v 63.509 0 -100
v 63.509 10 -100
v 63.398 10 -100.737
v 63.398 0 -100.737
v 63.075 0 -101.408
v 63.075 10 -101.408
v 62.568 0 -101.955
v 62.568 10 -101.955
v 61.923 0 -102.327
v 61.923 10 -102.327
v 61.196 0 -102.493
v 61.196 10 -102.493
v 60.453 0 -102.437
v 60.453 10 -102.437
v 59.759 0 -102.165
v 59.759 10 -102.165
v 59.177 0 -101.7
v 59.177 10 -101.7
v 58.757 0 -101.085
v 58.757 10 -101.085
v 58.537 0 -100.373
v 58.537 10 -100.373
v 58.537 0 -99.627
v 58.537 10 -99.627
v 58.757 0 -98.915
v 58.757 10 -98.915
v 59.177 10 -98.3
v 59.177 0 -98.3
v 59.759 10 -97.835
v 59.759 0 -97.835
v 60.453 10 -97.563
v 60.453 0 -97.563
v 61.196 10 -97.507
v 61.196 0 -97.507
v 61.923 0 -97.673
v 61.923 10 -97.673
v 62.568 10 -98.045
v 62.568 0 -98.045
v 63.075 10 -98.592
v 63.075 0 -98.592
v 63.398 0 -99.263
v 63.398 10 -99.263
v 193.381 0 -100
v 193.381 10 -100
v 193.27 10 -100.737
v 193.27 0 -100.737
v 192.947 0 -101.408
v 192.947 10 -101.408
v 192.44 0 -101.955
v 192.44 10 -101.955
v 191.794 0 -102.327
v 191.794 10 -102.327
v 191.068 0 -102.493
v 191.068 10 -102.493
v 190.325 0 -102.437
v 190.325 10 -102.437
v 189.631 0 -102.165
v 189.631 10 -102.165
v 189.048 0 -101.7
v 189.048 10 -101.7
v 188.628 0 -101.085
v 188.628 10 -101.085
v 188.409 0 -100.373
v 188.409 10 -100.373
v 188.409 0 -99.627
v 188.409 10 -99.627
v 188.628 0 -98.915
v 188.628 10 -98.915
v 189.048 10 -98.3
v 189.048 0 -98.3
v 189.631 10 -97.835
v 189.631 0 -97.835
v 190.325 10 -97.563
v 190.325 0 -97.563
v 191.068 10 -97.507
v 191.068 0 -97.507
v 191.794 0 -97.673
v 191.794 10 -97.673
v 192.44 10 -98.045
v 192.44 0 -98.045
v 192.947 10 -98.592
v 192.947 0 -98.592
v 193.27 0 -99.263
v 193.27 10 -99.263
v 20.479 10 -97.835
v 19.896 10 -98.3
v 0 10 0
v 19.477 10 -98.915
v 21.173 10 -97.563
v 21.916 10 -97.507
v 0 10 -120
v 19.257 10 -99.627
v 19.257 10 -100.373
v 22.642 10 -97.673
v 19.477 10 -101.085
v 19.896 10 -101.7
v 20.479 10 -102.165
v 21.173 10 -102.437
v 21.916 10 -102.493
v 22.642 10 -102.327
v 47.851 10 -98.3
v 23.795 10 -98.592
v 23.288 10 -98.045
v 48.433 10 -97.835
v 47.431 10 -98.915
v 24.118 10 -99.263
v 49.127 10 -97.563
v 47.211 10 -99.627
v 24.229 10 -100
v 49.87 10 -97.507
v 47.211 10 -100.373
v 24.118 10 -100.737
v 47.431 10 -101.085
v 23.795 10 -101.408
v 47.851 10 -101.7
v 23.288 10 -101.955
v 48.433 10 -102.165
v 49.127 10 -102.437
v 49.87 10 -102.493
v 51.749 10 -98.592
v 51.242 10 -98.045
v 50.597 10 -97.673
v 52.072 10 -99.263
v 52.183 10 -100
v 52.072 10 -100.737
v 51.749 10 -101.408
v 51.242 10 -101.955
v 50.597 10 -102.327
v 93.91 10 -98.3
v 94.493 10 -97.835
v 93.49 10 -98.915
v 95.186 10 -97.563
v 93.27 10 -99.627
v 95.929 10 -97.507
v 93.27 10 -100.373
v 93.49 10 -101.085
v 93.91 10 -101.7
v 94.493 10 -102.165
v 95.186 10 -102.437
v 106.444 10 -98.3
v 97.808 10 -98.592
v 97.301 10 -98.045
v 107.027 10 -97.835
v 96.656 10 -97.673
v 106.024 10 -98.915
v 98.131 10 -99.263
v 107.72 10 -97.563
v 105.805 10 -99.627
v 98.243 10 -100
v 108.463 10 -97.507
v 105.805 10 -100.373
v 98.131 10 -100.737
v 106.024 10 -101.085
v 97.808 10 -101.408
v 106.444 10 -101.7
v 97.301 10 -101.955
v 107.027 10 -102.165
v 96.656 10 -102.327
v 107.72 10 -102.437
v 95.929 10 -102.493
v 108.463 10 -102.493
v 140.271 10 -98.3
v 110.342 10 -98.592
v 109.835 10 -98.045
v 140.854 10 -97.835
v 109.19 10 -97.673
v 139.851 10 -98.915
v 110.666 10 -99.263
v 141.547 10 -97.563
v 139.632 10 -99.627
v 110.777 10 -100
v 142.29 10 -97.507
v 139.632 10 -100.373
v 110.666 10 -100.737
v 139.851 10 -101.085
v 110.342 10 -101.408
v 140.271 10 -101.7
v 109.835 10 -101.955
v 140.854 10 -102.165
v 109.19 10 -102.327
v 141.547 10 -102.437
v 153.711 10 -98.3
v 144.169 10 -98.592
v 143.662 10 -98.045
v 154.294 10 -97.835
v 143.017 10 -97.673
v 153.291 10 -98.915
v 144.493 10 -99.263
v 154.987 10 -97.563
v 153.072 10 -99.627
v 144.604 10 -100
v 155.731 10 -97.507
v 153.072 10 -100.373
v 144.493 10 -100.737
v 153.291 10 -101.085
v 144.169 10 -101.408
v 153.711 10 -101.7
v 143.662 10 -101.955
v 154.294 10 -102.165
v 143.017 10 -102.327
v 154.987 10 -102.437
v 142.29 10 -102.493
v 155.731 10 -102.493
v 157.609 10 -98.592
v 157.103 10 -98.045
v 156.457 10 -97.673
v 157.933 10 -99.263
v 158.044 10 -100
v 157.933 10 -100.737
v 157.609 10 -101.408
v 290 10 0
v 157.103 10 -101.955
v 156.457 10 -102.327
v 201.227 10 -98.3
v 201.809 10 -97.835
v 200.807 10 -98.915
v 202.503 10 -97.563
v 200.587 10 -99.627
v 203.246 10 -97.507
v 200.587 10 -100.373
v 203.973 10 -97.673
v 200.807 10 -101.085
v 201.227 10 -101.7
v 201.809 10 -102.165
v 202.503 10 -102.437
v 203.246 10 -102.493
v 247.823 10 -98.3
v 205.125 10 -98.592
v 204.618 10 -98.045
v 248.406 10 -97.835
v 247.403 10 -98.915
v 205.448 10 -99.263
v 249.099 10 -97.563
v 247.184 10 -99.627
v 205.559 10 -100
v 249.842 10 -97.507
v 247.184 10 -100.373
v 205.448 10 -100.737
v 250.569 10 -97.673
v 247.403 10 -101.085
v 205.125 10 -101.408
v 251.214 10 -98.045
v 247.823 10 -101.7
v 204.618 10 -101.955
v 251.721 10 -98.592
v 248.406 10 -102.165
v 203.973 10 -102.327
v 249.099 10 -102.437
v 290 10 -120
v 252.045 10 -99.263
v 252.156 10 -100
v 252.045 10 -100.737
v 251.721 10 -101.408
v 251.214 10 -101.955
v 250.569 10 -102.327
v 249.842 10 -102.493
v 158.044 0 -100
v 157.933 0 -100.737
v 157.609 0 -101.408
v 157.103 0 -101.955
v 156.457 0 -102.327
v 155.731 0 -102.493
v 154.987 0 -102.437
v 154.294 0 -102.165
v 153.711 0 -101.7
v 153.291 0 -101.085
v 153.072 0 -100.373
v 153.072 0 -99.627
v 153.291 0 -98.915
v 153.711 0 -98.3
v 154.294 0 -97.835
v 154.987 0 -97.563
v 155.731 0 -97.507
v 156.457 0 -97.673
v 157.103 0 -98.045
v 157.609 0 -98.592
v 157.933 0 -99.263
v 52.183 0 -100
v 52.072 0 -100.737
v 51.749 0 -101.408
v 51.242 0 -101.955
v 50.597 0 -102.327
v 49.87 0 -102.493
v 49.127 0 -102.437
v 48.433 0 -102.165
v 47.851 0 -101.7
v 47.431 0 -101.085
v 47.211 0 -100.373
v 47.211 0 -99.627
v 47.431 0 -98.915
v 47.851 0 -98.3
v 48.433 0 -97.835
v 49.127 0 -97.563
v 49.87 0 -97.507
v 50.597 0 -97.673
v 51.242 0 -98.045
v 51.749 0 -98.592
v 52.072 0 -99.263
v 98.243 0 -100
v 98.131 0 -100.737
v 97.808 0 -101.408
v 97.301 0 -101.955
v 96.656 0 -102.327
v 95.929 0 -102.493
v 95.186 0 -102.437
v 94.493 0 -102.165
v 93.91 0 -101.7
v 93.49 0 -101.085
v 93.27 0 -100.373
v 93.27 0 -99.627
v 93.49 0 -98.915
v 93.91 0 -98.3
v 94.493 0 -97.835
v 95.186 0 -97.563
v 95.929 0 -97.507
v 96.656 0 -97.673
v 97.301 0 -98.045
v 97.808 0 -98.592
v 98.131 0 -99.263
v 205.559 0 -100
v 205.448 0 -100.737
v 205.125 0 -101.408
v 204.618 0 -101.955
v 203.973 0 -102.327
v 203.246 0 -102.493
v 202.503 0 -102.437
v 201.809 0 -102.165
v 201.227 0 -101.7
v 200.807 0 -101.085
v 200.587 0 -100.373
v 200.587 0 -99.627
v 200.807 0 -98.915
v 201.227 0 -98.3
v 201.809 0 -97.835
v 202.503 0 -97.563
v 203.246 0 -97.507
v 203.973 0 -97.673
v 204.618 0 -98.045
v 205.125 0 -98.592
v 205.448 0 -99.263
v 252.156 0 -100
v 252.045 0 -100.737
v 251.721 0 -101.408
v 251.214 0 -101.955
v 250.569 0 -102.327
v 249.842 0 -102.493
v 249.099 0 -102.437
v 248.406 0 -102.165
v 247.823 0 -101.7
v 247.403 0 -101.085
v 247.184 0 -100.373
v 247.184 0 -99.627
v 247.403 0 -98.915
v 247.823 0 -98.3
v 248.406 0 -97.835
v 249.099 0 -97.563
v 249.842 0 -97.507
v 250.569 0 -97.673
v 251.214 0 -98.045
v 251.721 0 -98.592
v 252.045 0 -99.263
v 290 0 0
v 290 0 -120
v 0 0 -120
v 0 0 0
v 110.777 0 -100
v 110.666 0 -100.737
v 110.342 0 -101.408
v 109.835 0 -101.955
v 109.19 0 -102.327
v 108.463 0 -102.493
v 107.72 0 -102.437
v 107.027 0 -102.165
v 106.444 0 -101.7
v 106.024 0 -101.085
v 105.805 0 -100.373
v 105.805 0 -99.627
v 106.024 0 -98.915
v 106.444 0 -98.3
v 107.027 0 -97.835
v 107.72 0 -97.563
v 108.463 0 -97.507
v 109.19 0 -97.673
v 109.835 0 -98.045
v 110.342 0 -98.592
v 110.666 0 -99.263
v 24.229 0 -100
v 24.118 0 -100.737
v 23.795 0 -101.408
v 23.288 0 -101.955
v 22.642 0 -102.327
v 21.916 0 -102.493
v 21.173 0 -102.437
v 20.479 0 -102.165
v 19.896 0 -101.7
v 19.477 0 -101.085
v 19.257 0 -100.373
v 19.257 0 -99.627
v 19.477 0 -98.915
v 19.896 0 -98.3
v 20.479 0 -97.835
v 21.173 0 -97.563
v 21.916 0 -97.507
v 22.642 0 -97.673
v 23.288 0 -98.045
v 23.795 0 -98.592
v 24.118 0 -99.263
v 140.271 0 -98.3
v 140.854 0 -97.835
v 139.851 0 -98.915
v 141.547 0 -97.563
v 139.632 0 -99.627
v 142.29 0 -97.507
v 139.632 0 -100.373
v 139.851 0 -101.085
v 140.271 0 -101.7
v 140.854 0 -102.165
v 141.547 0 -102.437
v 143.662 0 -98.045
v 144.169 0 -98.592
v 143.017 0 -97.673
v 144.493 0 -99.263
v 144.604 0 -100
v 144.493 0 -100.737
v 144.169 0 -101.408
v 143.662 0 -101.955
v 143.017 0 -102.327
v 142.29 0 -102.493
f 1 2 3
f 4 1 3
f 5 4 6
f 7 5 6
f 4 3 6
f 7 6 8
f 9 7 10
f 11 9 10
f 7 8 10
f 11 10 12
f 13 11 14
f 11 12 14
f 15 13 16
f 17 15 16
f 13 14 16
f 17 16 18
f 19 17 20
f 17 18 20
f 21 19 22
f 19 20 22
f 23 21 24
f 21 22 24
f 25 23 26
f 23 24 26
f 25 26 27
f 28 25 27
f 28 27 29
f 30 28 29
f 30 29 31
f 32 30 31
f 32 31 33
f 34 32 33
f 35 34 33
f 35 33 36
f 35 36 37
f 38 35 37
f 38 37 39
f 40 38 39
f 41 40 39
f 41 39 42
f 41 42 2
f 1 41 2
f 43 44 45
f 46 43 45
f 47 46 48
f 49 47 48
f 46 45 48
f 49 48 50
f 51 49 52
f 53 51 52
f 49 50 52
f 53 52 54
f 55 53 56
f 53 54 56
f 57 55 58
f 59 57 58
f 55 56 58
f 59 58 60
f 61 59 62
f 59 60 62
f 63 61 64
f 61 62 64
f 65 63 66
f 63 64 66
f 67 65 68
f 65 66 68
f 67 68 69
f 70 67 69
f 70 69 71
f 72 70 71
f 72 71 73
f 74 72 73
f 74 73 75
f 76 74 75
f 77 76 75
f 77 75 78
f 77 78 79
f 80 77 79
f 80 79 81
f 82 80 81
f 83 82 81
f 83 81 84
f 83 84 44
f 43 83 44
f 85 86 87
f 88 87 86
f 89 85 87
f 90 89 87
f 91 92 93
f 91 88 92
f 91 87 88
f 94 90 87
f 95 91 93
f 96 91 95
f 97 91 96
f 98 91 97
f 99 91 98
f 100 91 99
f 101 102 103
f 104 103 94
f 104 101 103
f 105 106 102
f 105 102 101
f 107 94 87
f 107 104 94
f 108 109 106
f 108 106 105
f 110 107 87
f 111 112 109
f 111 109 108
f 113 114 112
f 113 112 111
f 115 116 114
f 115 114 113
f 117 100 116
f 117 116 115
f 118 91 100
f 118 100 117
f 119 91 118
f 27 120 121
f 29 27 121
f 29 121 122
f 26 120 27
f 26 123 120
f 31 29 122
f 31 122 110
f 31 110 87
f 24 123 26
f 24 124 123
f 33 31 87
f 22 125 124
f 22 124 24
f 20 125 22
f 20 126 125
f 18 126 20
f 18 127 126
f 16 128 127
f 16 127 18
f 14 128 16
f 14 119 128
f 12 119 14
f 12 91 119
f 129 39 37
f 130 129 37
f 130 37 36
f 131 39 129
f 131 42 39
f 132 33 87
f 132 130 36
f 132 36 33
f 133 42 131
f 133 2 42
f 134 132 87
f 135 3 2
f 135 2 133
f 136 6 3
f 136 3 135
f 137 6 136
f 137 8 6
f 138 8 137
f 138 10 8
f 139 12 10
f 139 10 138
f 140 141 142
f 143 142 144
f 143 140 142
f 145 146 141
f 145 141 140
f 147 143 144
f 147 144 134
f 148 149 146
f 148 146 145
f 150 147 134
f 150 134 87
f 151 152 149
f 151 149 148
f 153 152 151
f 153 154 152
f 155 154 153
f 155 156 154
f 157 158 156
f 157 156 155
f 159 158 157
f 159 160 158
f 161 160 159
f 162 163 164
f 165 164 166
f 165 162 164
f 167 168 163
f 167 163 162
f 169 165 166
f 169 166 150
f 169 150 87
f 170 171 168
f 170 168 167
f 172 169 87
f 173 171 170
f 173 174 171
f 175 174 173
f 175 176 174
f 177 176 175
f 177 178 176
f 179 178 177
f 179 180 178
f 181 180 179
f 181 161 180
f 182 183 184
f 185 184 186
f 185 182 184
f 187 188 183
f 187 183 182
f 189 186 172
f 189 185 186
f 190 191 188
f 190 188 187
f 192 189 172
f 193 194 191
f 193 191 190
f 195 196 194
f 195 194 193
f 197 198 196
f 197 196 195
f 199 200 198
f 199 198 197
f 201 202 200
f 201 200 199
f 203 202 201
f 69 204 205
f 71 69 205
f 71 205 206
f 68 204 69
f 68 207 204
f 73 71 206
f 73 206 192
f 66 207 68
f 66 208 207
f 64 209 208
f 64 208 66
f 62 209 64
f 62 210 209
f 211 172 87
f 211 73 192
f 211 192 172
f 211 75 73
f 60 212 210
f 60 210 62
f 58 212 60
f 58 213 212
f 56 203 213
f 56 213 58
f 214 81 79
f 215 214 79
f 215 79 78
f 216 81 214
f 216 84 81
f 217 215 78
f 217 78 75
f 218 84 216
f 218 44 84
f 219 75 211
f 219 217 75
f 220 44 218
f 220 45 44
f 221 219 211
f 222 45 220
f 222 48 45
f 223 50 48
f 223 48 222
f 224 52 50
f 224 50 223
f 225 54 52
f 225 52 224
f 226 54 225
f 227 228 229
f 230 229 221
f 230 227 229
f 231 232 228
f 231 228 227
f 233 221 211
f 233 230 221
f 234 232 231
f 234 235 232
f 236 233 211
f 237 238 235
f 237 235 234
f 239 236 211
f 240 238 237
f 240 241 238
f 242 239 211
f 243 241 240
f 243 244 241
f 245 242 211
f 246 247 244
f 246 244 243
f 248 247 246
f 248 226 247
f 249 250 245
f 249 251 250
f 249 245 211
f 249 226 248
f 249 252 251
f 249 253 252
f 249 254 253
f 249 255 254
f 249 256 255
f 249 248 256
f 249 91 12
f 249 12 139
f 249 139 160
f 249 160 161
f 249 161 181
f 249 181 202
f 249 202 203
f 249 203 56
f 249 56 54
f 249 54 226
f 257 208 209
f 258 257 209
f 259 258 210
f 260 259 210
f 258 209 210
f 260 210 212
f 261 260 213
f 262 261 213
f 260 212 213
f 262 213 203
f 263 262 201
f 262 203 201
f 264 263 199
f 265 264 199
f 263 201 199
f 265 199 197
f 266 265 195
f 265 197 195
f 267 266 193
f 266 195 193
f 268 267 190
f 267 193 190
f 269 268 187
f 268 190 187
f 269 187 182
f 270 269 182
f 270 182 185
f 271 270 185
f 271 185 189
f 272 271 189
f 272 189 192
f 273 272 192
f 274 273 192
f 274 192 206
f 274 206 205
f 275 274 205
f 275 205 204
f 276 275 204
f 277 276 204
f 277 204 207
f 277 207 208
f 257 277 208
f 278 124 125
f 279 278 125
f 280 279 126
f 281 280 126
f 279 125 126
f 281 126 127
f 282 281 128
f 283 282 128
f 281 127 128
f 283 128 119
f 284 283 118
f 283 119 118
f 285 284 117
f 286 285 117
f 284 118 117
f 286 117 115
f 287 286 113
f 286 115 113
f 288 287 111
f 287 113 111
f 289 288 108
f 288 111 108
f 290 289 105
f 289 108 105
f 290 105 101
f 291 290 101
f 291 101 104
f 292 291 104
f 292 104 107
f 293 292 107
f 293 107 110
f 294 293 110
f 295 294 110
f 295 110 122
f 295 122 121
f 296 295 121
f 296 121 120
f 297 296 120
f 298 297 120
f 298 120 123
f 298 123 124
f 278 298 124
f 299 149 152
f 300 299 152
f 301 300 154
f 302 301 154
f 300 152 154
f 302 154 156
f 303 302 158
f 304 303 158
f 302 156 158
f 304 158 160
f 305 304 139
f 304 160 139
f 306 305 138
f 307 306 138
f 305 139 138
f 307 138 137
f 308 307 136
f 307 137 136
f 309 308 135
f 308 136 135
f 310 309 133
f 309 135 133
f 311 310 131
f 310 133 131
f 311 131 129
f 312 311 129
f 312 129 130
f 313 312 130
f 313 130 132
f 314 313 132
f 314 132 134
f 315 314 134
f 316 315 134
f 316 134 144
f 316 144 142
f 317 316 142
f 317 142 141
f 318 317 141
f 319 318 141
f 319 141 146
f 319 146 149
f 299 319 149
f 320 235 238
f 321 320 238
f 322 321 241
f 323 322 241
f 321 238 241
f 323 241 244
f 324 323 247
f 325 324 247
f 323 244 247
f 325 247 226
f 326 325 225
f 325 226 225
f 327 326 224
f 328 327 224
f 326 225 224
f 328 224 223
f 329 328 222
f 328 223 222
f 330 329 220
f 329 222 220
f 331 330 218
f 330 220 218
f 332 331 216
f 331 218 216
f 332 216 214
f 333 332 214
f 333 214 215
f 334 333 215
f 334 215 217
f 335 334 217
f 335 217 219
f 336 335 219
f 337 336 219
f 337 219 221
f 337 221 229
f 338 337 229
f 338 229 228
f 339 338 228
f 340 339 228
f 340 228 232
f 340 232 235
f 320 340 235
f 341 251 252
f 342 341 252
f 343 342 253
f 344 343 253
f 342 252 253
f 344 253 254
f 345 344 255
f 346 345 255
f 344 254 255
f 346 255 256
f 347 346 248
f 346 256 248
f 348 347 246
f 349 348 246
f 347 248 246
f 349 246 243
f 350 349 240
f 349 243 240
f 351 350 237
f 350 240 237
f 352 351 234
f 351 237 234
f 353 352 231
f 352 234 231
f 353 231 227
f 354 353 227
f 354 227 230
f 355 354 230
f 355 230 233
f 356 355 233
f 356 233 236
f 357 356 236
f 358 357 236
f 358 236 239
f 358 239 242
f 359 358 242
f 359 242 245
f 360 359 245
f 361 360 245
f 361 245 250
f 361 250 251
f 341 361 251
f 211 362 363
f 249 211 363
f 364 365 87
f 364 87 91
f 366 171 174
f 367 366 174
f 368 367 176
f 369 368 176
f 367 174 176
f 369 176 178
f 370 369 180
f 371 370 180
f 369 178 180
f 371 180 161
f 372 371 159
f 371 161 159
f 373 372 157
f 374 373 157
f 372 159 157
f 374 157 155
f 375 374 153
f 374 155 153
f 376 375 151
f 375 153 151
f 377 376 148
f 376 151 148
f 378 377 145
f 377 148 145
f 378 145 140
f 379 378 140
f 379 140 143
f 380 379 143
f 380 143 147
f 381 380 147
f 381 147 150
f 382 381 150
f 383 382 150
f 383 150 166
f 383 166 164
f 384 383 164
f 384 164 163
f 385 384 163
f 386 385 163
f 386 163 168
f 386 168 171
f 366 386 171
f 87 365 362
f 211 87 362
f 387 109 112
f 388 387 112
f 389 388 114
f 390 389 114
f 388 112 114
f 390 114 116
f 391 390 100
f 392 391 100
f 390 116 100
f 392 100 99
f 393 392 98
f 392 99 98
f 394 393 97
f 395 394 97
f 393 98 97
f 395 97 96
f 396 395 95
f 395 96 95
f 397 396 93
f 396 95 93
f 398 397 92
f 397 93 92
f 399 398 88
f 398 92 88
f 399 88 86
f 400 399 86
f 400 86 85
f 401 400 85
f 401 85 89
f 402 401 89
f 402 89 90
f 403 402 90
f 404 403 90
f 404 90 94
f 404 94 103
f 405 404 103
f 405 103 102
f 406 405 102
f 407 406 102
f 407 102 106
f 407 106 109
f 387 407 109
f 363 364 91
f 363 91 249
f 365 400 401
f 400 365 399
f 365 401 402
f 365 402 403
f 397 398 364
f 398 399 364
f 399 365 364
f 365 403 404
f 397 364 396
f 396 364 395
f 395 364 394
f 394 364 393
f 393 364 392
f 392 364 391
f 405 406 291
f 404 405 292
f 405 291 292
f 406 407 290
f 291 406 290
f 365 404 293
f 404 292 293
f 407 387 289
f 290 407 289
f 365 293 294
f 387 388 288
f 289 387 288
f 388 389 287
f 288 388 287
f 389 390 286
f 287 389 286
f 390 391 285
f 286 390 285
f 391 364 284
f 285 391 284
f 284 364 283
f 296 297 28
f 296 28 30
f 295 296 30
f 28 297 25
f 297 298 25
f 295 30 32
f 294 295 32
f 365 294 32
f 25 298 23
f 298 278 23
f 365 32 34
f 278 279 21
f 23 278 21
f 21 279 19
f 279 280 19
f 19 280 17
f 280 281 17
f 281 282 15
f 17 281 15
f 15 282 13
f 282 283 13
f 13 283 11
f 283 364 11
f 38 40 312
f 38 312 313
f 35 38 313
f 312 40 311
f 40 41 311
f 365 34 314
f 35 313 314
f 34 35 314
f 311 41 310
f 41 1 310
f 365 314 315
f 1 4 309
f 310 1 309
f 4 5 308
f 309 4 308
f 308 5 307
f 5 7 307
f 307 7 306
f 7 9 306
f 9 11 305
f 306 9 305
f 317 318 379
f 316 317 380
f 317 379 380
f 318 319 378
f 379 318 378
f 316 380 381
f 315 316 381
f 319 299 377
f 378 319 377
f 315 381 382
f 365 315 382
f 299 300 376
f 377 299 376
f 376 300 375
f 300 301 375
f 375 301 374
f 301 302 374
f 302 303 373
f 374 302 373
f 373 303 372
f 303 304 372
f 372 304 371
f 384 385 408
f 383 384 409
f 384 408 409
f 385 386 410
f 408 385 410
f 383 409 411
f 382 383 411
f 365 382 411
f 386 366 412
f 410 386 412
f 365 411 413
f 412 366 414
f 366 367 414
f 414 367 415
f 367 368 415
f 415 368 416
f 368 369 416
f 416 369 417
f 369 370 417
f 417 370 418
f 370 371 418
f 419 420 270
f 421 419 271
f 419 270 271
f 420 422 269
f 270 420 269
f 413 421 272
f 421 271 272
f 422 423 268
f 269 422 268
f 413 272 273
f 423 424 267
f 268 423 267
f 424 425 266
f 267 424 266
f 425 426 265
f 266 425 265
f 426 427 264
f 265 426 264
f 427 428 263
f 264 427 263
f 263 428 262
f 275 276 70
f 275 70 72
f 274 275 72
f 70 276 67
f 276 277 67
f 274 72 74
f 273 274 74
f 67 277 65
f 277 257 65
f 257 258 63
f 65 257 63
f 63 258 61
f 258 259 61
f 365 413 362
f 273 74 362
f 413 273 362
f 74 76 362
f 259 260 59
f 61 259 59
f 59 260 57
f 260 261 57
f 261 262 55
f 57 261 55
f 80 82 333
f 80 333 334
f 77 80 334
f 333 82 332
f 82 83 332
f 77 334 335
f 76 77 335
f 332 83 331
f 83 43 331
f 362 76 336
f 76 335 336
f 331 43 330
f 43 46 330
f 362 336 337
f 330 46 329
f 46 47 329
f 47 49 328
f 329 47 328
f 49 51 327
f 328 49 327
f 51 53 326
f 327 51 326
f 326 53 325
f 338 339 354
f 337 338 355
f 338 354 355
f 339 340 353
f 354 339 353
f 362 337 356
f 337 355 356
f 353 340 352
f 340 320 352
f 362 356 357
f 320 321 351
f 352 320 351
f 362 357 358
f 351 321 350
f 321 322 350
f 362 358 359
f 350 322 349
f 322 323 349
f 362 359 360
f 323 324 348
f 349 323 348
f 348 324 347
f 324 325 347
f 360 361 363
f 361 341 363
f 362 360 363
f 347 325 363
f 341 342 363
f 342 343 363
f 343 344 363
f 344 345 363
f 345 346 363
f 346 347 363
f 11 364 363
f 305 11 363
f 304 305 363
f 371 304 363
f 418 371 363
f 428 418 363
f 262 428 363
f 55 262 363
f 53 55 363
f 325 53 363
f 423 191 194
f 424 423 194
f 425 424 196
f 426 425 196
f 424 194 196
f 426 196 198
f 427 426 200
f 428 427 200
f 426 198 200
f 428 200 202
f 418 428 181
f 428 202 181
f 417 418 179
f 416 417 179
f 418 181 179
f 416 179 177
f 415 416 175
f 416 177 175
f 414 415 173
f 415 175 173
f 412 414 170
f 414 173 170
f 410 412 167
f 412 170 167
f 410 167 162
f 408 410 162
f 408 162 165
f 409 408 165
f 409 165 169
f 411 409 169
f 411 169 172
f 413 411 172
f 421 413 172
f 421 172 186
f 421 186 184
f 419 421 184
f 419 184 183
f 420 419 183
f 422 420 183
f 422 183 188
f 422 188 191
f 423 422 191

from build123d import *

# Parameters (mm, degrees)
SKETCH_1_W          = 290
SKETCH_1_H          = 120
EXTRUDE_1_DEPTH     = 10
SKETCH_2_R          = 2.5
CUT_EXTRUDE_1_DEPTH = 11


with BuildPart() as part:
    # Эскиз1 → Бобышка-Вытянуть1 (new body)
    with BuildSketch(Plane(origin=(0, 0, 0), x_dir=(1, 0, 0), z_dir=(0, 1, 0))):
        with Locations((145, 60)):
            Rectangle(SKETCH_1_W, SKETCH_1_H)
    extrude(amount=EXTRUDE_1_DEPTH)

    # Эскиз2 → Вырез-Вытянуть1 (cut, through all)
    with BuildSketch(Plane(origin=(0, 10, 0), x_dir=(1, 0, 0), z_dir=(0, 1, 0))):
        with Locations((203.059493975, 100)):
            Circle(SKETCH_2_R)
        with Locations((155.543798527, 100)):
            Circle(SKETCH_2_R)
        with Locations((108.276640676, 100)):
            Circle(SKETCH_2_R)
        with Locations((61.009482825, 100)):
            Circle(SKETCH_2_R)
        with Locations((21.729032917, 100)):
            Circle(SKETCH_2_R)
        with Locations((49.683486534, 100)):
            Circle(SKETCH_2_R)
        with Locations((95.742538115, 100)):
            Circle(SKETCH_2_R)
        with Locations((142.103616263, 100)):
            Circle(SKETCH_2_R)
        with Locations((190.880906953, 100)):
            Circle(SKETCH_2_R)
        with Locations((249.655647954, 100)):
            Circle(SKETCH_2_R)
    extrude(amount=-CUT_EXTRUDE_1_DEPTH, mode=Mode.SUBTRACT)


solid = part.part
